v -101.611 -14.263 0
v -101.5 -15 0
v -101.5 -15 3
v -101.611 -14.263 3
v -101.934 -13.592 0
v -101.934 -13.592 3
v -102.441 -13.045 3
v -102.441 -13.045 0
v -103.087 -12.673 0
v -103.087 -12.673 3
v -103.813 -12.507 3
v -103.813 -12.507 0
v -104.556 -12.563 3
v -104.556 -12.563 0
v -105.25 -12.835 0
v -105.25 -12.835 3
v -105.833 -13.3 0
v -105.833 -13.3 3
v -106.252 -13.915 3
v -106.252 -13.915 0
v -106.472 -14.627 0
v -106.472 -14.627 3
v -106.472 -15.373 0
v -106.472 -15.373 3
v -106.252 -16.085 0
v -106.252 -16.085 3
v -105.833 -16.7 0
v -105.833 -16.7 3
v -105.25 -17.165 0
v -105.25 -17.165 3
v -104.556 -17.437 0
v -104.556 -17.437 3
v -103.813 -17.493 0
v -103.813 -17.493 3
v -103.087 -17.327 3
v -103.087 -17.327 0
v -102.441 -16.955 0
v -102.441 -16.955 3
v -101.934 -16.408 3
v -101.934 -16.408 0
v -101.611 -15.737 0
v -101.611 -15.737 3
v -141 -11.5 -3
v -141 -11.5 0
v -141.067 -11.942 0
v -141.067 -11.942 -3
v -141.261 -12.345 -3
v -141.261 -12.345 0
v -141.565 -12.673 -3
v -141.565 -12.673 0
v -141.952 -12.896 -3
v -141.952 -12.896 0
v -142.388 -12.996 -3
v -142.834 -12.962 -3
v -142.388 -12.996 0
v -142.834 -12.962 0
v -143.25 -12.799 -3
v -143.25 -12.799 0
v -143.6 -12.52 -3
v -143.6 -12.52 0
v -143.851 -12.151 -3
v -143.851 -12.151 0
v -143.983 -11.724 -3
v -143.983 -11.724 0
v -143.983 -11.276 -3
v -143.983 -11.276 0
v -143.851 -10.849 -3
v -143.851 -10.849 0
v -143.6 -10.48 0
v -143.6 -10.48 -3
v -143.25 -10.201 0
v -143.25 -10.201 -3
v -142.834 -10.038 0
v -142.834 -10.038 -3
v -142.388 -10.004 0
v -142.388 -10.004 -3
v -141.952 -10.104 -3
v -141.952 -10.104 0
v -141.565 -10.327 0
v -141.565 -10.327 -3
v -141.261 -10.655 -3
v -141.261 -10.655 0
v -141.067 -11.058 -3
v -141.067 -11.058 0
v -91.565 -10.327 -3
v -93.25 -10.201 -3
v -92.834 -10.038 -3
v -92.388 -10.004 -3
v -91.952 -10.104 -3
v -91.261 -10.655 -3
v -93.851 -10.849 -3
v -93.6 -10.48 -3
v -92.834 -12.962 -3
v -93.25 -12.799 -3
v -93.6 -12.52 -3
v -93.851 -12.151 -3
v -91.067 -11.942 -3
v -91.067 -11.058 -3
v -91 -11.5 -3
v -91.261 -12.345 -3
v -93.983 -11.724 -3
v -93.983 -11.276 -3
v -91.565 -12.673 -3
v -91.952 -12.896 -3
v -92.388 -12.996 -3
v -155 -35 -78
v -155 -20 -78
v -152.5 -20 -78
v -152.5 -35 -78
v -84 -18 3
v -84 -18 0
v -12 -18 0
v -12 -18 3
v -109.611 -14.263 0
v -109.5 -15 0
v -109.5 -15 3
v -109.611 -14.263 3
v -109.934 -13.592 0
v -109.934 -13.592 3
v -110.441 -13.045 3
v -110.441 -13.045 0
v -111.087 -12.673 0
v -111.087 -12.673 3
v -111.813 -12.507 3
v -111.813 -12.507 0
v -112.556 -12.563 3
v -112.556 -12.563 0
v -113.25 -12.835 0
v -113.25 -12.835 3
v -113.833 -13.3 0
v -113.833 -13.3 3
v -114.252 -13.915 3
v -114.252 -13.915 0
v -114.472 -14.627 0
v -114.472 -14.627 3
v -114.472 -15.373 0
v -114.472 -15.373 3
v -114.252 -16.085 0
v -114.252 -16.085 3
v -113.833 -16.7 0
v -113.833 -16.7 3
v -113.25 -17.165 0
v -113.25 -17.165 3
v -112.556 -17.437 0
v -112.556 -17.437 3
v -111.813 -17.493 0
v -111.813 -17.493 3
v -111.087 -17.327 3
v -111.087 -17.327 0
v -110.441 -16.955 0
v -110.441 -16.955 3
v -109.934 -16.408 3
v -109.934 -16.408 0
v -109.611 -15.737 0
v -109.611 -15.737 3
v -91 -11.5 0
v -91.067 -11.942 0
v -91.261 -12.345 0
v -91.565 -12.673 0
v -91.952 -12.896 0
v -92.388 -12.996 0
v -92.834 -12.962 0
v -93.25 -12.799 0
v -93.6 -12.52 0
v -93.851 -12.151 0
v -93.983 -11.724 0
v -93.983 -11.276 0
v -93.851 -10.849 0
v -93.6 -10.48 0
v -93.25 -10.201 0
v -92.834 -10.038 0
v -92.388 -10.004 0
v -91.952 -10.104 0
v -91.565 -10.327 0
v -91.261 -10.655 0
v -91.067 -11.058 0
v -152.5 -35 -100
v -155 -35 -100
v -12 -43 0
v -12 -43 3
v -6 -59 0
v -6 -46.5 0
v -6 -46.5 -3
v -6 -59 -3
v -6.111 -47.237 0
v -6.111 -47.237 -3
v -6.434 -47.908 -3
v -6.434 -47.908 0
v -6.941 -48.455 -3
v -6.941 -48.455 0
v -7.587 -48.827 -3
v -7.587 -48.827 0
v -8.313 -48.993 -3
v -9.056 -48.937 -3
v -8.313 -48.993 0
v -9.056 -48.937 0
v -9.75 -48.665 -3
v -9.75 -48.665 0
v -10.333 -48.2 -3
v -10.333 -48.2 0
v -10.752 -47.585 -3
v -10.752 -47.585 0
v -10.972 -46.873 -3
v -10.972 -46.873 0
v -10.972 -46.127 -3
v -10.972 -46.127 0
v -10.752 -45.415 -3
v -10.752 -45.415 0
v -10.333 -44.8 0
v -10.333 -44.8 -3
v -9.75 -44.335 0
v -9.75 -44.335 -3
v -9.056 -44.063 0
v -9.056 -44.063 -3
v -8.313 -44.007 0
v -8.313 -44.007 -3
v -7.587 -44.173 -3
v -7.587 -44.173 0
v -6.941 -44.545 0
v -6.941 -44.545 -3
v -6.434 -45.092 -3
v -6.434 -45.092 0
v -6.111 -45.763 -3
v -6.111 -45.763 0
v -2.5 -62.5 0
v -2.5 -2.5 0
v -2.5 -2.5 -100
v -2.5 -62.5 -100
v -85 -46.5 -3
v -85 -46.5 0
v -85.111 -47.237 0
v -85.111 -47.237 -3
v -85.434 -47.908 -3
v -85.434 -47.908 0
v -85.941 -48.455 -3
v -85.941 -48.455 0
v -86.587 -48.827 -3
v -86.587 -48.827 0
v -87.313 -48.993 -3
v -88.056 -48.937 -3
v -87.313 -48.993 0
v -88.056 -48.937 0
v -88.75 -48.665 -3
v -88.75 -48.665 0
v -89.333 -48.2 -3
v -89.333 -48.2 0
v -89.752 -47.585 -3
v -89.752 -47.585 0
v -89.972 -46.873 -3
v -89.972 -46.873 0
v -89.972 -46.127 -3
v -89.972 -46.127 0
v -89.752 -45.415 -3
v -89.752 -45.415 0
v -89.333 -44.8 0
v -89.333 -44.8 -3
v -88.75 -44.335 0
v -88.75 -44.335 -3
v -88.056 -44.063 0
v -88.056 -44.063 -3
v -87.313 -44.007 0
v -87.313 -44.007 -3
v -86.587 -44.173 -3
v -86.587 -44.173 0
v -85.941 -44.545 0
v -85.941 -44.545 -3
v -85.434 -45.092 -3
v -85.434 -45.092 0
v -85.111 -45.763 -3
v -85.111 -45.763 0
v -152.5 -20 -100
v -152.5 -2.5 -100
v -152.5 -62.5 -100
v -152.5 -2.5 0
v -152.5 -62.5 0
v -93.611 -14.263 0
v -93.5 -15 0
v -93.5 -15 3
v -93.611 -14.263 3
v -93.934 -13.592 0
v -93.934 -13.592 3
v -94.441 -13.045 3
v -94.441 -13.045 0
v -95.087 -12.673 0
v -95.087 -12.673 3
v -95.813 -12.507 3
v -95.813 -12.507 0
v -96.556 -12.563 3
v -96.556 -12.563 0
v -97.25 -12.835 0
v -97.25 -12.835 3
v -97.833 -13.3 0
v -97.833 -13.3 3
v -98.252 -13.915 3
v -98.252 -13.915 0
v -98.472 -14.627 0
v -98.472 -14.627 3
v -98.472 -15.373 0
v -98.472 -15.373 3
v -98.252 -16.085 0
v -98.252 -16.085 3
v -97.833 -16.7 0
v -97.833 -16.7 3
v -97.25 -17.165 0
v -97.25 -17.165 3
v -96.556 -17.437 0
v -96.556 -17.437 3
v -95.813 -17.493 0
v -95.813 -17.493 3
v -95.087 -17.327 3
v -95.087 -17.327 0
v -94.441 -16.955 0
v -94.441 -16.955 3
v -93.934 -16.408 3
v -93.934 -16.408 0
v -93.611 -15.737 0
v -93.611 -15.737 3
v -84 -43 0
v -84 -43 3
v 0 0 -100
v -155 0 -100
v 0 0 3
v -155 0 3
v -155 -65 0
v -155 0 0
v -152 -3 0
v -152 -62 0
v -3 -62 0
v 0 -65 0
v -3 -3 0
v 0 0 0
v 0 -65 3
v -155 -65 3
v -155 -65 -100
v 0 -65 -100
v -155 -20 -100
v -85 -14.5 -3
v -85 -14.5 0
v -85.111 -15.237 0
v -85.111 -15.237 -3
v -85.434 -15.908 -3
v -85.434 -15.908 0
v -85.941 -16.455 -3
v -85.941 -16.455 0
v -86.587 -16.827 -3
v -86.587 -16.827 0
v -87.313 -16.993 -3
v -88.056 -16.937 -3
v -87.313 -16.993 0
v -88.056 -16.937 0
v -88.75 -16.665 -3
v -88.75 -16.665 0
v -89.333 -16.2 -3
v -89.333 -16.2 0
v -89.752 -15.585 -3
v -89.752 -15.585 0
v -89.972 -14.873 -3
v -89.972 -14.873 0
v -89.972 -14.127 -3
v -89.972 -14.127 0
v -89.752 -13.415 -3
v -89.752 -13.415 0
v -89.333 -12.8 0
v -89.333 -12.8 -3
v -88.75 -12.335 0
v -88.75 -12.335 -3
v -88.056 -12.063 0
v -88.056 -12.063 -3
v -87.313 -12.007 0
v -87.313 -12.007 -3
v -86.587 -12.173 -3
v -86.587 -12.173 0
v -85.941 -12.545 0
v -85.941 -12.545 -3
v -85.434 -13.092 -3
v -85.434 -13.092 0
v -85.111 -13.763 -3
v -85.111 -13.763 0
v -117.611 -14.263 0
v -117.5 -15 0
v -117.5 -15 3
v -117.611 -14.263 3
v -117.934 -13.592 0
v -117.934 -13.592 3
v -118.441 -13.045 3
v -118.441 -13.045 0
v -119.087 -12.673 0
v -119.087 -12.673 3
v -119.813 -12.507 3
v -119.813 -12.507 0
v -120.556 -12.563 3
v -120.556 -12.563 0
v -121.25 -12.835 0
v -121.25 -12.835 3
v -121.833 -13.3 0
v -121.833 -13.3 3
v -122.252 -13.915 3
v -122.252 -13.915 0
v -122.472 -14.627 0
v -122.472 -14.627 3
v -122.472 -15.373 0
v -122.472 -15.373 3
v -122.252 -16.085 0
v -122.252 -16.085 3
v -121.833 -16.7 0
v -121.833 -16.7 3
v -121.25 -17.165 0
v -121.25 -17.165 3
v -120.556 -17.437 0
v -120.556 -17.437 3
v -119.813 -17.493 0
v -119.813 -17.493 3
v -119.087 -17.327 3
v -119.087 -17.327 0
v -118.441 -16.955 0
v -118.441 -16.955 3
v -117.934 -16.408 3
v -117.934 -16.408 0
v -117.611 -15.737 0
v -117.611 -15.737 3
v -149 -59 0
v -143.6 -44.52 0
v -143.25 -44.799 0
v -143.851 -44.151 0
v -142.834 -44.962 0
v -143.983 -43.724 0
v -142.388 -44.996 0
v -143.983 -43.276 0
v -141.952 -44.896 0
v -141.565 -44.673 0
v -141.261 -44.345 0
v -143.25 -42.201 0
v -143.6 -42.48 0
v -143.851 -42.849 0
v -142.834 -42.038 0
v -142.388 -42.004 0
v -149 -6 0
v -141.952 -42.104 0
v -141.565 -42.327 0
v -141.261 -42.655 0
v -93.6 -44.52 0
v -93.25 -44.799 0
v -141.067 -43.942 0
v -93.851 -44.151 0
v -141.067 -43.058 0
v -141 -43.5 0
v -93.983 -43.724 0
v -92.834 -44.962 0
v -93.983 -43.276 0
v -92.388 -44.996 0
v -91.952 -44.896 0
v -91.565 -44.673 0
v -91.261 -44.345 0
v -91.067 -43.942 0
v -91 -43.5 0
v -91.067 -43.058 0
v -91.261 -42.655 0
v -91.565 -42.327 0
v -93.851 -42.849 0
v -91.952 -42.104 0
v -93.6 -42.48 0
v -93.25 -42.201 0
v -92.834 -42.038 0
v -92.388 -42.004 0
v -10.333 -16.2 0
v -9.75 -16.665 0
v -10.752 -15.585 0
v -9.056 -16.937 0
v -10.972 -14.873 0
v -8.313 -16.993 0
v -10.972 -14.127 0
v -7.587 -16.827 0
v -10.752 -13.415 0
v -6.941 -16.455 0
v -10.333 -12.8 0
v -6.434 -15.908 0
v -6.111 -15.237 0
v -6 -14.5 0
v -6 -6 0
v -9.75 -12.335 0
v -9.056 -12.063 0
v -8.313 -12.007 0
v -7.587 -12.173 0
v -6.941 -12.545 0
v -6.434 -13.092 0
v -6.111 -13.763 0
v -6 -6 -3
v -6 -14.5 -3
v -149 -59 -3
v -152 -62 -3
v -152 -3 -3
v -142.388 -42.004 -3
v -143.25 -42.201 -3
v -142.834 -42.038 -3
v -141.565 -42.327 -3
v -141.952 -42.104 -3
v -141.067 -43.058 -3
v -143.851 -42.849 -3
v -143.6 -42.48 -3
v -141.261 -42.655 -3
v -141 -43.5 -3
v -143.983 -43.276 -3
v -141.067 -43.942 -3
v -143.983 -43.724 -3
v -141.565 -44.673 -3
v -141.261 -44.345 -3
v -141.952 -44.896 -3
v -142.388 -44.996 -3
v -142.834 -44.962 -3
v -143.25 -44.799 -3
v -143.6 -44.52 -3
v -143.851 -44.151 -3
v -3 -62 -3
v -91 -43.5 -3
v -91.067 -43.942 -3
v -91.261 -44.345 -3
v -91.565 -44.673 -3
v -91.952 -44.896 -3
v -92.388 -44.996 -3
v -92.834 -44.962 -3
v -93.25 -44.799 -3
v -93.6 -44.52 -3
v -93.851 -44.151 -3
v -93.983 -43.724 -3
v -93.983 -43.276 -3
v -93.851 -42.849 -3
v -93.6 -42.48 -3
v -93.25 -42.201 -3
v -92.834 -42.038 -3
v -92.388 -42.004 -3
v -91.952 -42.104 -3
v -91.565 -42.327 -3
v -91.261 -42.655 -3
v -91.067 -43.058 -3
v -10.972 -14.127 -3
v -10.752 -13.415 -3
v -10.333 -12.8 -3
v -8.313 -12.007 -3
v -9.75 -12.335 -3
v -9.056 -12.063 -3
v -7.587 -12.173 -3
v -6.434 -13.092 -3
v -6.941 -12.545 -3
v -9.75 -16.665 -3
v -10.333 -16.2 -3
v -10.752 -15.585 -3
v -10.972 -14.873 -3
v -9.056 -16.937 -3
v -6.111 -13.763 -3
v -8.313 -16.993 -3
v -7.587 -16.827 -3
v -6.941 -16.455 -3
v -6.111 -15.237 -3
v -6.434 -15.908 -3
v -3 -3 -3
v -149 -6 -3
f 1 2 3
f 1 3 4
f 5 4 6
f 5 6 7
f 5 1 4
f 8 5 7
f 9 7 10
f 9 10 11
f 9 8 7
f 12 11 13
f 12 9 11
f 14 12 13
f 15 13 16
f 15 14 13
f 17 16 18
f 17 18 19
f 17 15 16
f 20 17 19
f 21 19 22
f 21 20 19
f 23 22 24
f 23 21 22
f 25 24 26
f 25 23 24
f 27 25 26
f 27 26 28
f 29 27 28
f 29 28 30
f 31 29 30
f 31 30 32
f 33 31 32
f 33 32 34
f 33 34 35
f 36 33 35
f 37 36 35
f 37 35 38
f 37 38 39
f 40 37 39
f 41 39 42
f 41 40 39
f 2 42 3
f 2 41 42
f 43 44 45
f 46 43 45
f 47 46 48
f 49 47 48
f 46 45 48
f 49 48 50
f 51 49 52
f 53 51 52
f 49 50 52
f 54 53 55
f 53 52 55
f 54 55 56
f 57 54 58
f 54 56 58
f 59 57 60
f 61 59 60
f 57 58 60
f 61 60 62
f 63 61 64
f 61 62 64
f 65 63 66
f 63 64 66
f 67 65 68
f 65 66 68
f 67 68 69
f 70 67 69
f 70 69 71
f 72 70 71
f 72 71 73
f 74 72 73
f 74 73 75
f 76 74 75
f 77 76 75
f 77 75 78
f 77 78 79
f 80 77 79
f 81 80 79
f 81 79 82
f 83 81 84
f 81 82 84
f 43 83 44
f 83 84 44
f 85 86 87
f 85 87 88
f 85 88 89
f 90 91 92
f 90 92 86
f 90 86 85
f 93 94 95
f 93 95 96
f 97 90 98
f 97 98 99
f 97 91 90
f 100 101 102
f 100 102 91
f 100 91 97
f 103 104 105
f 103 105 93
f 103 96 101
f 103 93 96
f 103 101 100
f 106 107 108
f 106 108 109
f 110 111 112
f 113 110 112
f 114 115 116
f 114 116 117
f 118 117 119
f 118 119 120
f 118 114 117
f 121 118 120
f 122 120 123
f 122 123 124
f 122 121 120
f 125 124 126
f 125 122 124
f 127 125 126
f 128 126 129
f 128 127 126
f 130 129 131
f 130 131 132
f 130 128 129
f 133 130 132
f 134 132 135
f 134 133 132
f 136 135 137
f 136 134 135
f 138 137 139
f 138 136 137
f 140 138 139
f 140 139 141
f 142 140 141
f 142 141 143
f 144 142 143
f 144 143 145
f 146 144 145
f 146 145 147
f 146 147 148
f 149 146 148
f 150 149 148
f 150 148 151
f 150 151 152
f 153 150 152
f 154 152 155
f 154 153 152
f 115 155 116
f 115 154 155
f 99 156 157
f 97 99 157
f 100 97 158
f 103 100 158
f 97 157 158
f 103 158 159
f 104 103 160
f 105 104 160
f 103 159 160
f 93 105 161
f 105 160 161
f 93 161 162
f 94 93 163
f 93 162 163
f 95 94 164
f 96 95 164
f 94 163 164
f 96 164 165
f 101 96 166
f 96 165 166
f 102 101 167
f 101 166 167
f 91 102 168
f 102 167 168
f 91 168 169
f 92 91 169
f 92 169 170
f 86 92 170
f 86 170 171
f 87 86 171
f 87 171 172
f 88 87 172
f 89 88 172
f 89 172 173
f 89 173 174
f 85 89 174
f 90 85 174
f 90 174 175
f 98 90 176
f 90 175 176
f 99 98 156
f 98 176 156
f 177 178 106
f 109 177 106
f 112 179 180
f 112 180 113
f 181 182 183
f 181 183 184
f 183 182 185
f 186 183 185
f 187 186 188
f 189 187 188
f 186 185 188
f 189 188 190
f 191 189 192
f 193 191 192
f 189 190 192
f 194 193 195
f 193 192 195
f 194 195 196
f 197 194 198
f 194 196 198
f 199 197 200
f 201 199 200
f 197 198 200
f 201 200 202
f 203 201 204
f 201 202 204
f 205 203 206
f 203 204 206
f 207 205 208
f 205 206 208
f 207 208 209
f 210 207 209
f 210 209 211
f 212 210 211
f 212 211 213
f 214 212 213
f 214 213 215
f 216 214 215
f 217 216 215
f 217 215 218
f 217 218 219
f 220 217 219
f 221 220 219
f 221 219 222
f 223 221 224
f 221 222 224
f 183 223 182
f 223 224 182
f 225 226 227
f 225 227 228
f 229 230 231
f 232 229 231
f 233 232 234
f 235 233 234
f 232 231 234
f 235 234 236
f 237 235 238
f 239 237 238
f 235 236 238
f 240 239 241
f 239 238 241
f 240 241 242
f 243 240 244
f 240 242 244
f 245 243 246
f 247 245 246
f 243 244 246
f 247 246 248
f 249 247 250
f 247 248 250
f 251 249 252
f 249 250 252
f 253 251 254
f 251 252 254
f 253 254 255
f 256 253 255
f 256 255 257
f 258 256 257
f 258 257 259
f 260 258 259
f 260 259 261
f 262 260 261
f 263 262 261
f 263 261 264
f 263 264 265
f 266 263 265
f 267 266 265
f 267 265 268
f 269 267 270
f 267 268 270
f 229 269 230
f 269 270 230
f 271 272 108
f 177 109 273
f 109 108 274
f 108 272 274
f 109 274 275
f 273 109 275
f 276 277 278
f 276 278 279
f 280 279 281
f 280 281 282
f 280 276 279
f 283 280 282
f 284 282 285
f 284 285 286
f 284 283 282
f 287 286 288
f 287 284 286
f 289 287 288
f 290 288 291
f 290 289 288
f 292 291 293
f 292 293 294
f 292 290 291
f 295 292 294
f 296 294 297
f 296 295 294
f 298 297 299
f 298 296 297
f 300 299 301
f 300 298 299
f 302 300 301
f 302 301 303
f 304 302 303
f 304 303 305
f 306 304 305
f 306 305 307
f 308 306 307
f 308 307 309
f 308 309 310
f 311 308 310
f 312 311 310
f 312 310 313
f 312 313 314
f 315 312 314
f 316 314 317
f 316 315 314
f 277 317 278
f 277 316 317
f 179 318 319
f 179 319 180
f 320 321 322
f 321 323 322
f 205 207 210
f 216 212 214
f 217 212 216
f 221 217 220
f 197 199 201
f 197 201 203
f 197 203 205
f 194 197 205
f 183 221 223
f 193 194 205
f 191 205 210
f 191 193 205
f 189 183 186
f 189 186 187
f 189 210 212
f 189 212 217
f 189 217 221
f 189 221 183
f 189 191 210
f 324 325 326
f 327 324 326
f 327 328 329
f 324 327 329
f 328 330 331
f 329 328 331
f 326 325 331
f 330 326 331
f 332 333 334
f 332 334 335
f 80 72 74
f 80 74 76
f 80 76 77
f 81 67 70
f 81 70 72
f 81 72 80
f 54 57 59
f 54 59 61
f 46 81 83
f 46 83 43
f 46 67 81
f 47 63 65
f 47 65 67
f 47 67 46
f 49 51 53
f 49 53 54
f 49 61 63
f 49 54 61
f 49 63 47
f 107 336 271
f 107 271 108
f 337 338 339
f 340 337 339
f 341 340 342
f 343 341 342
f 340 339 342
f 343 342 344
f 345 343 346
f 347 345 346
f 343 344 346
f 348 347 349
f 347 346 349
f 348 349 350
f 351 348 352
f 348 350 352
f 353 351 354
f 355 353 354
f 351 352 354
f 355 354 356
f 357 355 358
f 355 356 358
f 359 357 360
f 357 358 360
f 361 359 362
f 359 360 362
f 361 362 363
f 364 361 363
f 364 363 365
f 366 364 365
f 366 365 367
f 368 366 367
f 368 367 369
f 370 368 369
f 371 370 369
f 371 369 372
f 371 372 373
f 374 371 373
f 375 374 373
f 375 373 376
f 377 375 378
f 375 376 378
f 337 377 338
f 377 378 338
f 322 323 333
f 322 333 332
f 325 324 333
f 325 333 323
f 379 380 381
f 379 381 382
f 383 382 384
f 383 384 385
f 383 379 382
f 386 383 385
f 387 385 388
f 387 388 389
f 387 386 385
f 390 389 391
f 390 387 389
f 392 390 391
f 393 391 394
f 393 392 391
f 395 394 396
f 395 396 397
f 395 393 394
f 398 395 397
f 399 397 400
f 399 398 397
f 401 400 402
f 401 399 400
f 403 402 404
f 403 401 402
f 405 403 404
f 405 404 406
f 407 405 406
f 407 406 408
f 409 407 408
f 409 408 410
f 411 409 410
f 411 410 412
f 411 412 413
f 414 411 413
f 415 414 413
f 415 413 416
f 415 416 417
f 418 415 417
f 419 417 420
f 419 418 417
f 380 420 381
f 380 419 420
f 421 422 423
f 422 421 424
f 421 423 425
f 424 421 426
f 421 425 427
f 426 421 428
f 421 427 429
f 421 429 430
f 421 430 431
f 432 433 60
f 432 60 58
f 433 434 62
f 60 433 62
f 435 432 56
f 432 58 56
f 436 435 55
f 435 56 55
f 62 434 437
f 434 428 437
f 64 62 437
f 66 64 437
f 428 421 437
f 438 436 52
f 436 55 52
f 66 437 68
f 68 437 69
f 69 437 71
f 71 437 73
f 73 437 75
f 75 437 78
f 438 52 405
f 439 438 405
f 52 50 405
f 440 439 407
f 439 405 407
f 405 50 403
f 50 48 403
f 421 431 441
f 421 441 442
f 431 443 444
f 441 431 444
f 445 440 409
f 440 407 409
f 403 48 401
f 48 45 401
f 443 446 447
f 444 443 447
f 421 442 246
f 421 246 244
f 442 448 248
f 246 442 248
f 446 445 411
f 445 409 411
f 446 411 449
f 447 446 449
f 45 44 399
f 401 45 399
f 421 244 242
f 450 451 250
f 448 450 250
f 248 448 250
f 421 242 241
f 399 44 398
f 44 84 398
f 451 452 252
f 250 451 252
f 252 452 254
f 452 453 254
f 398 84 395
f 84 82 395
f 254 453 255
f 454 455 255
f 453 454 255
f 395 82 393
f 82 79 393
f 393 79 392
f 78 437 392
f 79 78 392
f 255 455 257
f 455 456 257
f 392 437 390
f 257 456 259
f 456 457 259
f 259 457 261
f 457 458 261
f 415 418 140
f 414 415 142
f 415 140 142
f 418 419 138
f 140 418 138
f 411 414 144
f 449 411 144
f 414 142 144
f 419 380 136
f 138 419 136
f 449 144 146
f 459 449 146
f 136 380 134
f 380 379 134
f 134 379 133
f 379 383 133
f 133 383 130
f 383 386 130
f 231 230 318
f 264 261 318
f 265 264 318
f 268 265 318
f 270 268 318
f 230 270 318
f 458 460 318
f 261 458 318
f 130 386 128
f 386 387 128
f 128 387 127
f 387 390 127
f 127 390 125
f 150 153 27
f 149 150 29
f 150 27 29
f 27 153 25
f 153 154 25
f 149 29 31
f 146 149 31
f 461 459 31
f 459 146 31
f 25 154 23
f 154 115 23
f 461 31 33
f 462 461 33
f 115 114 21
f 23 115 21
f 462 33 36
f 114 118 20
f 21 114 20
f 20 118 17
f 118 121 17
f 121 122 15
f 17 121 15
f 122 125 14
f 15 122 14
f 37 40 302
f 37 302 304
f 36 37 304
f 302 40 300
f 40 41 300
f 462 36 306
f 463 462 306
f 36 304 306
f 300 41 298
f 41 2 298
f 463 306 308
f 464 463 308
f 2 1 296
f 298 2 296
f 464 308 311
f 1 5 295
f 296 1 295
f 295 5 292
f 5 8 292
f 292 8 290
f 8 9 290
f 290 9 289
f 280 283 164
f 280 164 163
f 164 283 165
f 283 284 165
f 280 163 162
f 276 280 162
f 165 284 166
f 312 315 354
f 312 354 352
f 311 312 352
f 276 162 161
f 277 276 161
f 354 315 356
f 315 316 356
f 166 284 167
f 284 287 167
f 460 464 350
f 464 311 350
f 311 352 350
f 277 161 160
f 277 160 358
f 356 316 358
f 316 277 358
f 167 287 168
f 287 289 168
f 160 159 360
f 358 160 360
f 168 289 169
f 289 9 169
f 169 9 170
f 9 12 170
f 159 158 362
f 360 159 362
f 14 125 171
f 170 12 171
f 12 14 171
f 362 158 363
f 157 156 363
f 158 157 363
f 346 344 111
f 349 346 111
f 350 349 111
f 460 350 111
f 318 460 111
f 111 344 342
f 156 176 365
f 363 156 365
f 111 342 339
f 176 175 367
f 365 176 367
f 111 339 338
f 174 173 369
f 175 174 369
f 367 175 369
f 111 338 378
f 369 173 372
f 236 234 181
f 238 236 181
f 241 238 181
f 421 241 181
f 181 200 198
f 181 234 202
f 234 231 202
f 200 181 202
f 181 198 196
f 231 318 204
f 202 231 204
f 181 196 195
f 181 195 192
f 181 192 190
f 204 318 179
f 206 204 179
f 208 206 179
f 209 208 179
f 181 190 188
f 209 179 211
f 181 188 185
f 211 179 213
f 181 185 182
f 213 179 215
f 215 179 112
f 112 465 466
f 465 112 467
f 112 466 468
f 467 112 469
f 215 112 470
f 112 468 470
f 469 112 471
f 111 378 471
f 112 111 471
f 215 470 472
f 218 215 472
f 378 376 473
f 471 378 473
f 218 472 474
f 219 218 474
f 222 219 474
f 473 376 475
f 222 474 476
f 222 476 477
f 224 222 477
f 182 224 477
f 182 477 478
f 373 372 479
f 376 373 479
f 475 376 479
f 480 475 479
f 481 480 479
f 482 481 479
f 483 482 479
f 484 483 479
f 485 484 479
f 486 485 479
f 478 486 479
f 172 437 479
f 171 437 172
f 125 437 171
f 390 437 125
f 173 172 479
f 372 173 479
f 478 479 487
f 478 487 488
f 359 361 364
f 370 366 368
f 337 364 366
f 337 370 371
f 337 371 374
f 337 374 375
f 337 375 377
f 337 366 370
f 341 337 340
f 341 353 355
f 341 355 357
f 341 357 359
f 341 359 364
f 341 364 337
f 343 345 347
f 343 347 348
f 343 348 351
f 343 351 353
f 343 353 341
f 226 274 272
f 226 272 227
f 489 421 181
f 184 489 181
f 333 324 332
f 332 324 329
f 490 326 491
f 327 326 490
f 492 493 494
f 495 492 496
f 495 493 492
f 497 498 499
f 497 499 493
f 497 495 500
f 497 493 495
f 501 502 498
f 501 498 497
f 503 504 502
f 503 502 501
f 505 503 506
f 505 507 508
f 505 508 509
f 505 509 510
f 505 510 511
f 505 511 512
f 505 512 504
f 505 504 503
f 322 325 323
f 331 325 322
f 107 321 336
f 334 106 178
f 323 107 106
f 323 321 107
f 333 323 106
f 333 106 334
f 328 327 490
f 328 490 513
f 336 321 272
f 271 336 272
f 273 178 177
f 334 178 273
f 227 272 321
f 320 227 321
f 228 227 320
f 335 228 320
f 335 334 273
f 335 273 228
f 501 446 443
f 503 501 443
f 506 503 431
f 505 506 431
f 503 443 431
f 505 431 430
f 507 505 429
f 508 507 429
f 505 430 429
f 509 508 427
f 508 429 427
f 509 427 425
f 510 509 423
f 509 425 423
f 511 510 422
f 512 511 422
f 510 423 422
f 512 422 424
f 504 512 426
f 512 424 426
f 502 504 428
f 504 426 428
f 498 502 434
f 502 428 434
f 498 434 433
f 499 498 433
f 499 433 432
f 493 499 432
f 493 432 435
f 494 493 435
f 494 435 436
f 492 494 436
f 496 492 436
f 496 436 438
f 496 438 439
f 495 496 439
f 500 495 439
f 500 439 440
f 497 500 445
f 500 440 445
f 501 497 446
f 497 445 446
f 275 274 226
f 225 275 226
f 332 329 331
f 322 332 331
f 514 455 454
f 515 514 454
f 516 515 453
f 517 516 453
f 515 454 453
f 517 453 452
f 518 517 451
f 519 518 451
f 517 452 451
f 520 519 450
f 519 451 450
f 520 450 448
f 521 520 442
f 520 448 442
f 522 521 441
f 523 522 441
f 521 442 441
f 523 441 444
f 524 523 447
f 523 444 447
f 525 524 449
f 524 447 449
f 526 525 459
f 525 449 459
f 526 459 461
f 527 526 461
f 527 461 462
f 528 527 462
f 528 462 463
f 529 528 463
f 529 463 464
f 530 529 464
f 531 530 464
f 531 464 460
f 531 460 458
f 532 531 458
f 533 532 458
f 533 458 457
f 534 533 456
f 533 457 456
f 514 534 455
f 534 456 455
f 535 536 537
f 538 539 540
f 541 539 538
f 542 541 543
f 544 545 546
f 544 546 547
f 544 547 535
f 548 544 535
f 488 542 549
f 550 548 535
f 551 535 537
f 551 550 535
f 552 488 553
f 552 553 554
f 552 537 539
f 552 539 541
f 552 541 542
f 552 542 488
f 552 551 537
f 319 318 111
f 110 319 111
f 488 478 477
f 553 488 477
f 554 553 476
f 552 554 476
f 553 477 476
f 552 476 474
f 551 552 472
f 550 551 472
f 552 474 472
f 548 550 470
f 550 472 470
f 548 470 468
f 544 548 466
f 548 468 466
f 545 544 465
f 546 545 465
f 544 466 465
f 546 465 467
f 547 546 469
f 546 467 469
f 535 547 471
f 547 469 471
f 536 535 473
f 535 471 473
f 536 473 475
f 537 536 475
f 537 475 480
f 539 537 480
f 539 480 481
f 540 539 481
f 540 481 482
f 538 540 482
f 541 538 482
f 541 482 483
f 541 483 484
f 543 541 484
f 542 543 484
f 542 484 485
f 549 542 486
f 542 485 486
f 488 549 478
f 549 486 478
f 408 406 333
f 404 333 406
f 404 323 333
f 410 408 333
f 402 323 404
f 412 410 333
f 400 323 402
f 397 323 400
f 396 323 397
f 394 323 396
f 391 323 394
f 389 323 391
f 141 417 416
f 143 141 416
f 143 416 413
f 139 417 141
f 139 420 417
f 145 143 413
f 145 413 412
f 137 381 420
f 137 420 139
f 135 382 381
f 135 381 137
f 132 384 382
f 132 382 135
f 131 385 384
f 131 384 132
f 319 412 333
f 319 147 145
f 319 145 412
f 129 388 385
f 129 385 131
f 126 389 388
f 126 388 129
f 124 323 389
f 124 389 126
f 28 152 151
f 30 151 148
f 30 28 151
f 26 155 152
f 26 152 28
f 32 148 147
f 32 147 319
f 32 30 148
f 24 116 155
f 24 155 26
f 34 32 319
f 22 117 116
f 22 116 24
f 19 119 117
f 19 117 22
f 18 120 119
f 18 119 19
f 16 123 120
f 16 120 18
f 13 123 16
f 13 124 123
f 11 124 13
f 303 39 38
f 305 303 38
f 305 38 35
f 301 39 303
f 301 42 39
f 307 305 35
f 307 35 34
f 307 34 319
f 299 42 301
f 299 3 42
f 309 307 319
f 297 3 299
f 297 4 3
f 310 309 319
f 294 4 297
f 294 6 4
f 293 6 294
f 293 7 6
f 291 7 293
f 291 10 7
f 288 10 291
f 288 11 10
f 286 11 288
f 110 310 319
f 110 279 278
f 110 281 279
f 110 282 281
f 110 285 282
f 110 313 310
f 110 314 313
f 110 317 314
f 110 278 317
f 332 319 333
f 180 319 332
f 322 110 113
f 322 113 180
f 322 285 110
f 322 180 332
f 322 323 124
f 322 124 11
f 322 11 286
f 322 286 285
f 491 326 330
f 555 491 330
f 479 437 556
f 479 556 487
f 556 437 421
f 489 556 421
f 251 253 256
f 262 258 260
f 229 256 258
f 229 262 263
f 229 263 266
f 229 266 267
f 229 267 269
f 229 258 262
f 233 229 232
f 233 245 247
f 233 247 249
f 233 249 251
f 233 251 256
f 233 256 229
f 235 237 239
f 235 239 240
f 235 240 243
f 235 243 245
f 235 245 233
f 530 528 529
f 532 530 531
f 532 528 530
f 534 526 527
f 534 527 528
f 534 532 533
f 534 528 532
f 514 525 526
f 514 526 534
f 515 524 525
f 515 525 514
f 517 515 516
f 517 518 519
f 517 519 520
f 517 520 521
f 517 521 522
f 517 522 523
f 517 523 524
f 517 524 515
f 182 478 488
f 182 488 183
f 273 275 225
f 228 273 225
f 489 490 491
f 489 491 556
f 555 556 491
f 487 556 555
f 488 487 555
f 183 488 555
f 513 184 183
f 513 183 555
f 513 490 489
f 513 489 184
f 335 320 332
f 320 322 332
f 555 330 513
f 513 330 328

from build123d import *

# Parameters (mm, degrees)
SKETCH_W      = 155
SKETCH_H      = 65
SKETCH_R      = 2.5
SKETCH_W_2    = 72
SKETCH_H_2    = 25
PAD_DEPTH     = 3
SKETCH001_W   = 149
SKETCH001_H   = 59
SKETCH001_W_2 = 143
SKETCH001_H_2 = 53
PAD001_DEPTH  = 3
SKETCH002_R   = 1.5
SKETCH002_R_2 = 2.5
PAD002_DEPTH  = 3
SKETCH003_W   = 155
SKETCH003_H   = 65
PAD003_DEPTH  = 3
SKETCH004_W   = 155
SKETCH004_H   = 65
SKETCH004_W_2 = 150
SKETCH004_H_2 = 60
PAD004_DEPTH  = 100
SKETCH005_W   = 15
SKETCH005_H   = 22
POCKET_DEPTH  = 5


with BuildPart() as lid:
    # Sketch → Pad (new body)
    with BuildSketch(Plane.XY):
        with Locations((-77.5, -32.5)):
            Rectangle(SKETCH_W, SKETCH_H)
        with Locations((-120, -15)):
            Circle(SKETCH_R, mode=Mode.SUBTRACT)
        with Locations((-112, -15)):
            Circle(SKETCH_R, mode=Mode.SUBTRACT)
        with Locations((-104, -15)):
            Circle(SKETCH_R, mode=Mode.SUBTRACT)
        with Locations((-96, -15)):
            Circle(SKETCH_R, mode=Mode.SUBTRACT)
        with Locations((-48, -30.5)):
            Rectangle(SKETCH_W_2, SKETCH_H_2, mode=Mode.SUBTRACT)
    extrude(amount=PAD_DEPTH)

    # Sketch001 (on Face13 of Pad) → Pad001 (join)
    with BuildSketch(Plane(origin=(0, 0, 0), x_dir=(1, 0, 0), z_dir=(0, 0, -1))):
        with Locations((-77.5, 32.5)):
            Rectangle(SKETCH001_W, SKETCH001_H)
        with Locations((-77.5, 32.5)):
            Rectangle(SKETCH001_W_2, SKETCH001_H_2, mode=Mode.SUBTRACT)
    extrude(amount=PAD001_DEPTH)

    # Sketch002 (on Face20 of Pad001) → Pad002 (join)
    with BuildSketch(Plane(origin=(0, 0, 0), x_dir=(1, 0, 0), z_dir=(0, 0, -1))):
        with Locations((-142.5, 43.5)):
            Circle(SKETCH002_R)
        with Locations((-142.5, 11.5)):
            Circle(SKETCH002_R)
        with Locations((-92.5, 43.5)):
            Circle(SKETCH002_R)
        with Locations((-92.5, 11.5)):
            Circle(SKETCH002_R)
        with Locations((-87.5, 46.5)):
            Circle(SKETCH002_R_2)
        with Locations((-8.5, 46.5)):
            Circle(SKETCH002_R_2)
        with Locations((-8.5, 14.5)):
            Circle(SKETCH002_R_2)
        with Locations((-87.5, 14.5)):
            Circle(SKETCH002_R_2)
    extrude(amount=PAD002_DEPTH)


with BuildPart() as box:
    # Sketch003 → Pad003 (new body)
    with BuildSketch(Plane.XY):
        with Locations((-77.5, -32.5)):
            Rectangle(SKETCH003_W, SKETCH003_H)
    extrude(amount=PAD003_DEPTH)

    # Sketch004 (on Face5 of Pad003) → Pad004 (join)
    with BuildSketch(Plane(origin=(0, 0, 0), x_dir=(1, 0, 0), z_dir=(0, 0, -1))):
        with Locations((-77.5, 32.5)):
            Rectangle(SKETCH004_W, SKETCH004_H)
        with Locations((-77.5, 32.5)):
            Rectangle(SKETCH004_W_2, SKETCH004_H_2, mode=Mode.SUBTRACT)
    extrude(amount=PAD004_DEPTH)

    # Sketch005 (on Face7 of Pad004) → Pocket (cut)
    with BuildSketch(Plane(origin=(-155, 0, 0), x_dir=(0, -1, 0), z_dir=(-1, 0, 0))):
        with Locations((27.5, -89)):
            Rectangle(SKETCH005_W, SKETCH005_H)
    extrude(amount=-POCKET_DEPTH, mode=Mode.SUBTRACT)


solid = Compound([lid.part, box.part])
